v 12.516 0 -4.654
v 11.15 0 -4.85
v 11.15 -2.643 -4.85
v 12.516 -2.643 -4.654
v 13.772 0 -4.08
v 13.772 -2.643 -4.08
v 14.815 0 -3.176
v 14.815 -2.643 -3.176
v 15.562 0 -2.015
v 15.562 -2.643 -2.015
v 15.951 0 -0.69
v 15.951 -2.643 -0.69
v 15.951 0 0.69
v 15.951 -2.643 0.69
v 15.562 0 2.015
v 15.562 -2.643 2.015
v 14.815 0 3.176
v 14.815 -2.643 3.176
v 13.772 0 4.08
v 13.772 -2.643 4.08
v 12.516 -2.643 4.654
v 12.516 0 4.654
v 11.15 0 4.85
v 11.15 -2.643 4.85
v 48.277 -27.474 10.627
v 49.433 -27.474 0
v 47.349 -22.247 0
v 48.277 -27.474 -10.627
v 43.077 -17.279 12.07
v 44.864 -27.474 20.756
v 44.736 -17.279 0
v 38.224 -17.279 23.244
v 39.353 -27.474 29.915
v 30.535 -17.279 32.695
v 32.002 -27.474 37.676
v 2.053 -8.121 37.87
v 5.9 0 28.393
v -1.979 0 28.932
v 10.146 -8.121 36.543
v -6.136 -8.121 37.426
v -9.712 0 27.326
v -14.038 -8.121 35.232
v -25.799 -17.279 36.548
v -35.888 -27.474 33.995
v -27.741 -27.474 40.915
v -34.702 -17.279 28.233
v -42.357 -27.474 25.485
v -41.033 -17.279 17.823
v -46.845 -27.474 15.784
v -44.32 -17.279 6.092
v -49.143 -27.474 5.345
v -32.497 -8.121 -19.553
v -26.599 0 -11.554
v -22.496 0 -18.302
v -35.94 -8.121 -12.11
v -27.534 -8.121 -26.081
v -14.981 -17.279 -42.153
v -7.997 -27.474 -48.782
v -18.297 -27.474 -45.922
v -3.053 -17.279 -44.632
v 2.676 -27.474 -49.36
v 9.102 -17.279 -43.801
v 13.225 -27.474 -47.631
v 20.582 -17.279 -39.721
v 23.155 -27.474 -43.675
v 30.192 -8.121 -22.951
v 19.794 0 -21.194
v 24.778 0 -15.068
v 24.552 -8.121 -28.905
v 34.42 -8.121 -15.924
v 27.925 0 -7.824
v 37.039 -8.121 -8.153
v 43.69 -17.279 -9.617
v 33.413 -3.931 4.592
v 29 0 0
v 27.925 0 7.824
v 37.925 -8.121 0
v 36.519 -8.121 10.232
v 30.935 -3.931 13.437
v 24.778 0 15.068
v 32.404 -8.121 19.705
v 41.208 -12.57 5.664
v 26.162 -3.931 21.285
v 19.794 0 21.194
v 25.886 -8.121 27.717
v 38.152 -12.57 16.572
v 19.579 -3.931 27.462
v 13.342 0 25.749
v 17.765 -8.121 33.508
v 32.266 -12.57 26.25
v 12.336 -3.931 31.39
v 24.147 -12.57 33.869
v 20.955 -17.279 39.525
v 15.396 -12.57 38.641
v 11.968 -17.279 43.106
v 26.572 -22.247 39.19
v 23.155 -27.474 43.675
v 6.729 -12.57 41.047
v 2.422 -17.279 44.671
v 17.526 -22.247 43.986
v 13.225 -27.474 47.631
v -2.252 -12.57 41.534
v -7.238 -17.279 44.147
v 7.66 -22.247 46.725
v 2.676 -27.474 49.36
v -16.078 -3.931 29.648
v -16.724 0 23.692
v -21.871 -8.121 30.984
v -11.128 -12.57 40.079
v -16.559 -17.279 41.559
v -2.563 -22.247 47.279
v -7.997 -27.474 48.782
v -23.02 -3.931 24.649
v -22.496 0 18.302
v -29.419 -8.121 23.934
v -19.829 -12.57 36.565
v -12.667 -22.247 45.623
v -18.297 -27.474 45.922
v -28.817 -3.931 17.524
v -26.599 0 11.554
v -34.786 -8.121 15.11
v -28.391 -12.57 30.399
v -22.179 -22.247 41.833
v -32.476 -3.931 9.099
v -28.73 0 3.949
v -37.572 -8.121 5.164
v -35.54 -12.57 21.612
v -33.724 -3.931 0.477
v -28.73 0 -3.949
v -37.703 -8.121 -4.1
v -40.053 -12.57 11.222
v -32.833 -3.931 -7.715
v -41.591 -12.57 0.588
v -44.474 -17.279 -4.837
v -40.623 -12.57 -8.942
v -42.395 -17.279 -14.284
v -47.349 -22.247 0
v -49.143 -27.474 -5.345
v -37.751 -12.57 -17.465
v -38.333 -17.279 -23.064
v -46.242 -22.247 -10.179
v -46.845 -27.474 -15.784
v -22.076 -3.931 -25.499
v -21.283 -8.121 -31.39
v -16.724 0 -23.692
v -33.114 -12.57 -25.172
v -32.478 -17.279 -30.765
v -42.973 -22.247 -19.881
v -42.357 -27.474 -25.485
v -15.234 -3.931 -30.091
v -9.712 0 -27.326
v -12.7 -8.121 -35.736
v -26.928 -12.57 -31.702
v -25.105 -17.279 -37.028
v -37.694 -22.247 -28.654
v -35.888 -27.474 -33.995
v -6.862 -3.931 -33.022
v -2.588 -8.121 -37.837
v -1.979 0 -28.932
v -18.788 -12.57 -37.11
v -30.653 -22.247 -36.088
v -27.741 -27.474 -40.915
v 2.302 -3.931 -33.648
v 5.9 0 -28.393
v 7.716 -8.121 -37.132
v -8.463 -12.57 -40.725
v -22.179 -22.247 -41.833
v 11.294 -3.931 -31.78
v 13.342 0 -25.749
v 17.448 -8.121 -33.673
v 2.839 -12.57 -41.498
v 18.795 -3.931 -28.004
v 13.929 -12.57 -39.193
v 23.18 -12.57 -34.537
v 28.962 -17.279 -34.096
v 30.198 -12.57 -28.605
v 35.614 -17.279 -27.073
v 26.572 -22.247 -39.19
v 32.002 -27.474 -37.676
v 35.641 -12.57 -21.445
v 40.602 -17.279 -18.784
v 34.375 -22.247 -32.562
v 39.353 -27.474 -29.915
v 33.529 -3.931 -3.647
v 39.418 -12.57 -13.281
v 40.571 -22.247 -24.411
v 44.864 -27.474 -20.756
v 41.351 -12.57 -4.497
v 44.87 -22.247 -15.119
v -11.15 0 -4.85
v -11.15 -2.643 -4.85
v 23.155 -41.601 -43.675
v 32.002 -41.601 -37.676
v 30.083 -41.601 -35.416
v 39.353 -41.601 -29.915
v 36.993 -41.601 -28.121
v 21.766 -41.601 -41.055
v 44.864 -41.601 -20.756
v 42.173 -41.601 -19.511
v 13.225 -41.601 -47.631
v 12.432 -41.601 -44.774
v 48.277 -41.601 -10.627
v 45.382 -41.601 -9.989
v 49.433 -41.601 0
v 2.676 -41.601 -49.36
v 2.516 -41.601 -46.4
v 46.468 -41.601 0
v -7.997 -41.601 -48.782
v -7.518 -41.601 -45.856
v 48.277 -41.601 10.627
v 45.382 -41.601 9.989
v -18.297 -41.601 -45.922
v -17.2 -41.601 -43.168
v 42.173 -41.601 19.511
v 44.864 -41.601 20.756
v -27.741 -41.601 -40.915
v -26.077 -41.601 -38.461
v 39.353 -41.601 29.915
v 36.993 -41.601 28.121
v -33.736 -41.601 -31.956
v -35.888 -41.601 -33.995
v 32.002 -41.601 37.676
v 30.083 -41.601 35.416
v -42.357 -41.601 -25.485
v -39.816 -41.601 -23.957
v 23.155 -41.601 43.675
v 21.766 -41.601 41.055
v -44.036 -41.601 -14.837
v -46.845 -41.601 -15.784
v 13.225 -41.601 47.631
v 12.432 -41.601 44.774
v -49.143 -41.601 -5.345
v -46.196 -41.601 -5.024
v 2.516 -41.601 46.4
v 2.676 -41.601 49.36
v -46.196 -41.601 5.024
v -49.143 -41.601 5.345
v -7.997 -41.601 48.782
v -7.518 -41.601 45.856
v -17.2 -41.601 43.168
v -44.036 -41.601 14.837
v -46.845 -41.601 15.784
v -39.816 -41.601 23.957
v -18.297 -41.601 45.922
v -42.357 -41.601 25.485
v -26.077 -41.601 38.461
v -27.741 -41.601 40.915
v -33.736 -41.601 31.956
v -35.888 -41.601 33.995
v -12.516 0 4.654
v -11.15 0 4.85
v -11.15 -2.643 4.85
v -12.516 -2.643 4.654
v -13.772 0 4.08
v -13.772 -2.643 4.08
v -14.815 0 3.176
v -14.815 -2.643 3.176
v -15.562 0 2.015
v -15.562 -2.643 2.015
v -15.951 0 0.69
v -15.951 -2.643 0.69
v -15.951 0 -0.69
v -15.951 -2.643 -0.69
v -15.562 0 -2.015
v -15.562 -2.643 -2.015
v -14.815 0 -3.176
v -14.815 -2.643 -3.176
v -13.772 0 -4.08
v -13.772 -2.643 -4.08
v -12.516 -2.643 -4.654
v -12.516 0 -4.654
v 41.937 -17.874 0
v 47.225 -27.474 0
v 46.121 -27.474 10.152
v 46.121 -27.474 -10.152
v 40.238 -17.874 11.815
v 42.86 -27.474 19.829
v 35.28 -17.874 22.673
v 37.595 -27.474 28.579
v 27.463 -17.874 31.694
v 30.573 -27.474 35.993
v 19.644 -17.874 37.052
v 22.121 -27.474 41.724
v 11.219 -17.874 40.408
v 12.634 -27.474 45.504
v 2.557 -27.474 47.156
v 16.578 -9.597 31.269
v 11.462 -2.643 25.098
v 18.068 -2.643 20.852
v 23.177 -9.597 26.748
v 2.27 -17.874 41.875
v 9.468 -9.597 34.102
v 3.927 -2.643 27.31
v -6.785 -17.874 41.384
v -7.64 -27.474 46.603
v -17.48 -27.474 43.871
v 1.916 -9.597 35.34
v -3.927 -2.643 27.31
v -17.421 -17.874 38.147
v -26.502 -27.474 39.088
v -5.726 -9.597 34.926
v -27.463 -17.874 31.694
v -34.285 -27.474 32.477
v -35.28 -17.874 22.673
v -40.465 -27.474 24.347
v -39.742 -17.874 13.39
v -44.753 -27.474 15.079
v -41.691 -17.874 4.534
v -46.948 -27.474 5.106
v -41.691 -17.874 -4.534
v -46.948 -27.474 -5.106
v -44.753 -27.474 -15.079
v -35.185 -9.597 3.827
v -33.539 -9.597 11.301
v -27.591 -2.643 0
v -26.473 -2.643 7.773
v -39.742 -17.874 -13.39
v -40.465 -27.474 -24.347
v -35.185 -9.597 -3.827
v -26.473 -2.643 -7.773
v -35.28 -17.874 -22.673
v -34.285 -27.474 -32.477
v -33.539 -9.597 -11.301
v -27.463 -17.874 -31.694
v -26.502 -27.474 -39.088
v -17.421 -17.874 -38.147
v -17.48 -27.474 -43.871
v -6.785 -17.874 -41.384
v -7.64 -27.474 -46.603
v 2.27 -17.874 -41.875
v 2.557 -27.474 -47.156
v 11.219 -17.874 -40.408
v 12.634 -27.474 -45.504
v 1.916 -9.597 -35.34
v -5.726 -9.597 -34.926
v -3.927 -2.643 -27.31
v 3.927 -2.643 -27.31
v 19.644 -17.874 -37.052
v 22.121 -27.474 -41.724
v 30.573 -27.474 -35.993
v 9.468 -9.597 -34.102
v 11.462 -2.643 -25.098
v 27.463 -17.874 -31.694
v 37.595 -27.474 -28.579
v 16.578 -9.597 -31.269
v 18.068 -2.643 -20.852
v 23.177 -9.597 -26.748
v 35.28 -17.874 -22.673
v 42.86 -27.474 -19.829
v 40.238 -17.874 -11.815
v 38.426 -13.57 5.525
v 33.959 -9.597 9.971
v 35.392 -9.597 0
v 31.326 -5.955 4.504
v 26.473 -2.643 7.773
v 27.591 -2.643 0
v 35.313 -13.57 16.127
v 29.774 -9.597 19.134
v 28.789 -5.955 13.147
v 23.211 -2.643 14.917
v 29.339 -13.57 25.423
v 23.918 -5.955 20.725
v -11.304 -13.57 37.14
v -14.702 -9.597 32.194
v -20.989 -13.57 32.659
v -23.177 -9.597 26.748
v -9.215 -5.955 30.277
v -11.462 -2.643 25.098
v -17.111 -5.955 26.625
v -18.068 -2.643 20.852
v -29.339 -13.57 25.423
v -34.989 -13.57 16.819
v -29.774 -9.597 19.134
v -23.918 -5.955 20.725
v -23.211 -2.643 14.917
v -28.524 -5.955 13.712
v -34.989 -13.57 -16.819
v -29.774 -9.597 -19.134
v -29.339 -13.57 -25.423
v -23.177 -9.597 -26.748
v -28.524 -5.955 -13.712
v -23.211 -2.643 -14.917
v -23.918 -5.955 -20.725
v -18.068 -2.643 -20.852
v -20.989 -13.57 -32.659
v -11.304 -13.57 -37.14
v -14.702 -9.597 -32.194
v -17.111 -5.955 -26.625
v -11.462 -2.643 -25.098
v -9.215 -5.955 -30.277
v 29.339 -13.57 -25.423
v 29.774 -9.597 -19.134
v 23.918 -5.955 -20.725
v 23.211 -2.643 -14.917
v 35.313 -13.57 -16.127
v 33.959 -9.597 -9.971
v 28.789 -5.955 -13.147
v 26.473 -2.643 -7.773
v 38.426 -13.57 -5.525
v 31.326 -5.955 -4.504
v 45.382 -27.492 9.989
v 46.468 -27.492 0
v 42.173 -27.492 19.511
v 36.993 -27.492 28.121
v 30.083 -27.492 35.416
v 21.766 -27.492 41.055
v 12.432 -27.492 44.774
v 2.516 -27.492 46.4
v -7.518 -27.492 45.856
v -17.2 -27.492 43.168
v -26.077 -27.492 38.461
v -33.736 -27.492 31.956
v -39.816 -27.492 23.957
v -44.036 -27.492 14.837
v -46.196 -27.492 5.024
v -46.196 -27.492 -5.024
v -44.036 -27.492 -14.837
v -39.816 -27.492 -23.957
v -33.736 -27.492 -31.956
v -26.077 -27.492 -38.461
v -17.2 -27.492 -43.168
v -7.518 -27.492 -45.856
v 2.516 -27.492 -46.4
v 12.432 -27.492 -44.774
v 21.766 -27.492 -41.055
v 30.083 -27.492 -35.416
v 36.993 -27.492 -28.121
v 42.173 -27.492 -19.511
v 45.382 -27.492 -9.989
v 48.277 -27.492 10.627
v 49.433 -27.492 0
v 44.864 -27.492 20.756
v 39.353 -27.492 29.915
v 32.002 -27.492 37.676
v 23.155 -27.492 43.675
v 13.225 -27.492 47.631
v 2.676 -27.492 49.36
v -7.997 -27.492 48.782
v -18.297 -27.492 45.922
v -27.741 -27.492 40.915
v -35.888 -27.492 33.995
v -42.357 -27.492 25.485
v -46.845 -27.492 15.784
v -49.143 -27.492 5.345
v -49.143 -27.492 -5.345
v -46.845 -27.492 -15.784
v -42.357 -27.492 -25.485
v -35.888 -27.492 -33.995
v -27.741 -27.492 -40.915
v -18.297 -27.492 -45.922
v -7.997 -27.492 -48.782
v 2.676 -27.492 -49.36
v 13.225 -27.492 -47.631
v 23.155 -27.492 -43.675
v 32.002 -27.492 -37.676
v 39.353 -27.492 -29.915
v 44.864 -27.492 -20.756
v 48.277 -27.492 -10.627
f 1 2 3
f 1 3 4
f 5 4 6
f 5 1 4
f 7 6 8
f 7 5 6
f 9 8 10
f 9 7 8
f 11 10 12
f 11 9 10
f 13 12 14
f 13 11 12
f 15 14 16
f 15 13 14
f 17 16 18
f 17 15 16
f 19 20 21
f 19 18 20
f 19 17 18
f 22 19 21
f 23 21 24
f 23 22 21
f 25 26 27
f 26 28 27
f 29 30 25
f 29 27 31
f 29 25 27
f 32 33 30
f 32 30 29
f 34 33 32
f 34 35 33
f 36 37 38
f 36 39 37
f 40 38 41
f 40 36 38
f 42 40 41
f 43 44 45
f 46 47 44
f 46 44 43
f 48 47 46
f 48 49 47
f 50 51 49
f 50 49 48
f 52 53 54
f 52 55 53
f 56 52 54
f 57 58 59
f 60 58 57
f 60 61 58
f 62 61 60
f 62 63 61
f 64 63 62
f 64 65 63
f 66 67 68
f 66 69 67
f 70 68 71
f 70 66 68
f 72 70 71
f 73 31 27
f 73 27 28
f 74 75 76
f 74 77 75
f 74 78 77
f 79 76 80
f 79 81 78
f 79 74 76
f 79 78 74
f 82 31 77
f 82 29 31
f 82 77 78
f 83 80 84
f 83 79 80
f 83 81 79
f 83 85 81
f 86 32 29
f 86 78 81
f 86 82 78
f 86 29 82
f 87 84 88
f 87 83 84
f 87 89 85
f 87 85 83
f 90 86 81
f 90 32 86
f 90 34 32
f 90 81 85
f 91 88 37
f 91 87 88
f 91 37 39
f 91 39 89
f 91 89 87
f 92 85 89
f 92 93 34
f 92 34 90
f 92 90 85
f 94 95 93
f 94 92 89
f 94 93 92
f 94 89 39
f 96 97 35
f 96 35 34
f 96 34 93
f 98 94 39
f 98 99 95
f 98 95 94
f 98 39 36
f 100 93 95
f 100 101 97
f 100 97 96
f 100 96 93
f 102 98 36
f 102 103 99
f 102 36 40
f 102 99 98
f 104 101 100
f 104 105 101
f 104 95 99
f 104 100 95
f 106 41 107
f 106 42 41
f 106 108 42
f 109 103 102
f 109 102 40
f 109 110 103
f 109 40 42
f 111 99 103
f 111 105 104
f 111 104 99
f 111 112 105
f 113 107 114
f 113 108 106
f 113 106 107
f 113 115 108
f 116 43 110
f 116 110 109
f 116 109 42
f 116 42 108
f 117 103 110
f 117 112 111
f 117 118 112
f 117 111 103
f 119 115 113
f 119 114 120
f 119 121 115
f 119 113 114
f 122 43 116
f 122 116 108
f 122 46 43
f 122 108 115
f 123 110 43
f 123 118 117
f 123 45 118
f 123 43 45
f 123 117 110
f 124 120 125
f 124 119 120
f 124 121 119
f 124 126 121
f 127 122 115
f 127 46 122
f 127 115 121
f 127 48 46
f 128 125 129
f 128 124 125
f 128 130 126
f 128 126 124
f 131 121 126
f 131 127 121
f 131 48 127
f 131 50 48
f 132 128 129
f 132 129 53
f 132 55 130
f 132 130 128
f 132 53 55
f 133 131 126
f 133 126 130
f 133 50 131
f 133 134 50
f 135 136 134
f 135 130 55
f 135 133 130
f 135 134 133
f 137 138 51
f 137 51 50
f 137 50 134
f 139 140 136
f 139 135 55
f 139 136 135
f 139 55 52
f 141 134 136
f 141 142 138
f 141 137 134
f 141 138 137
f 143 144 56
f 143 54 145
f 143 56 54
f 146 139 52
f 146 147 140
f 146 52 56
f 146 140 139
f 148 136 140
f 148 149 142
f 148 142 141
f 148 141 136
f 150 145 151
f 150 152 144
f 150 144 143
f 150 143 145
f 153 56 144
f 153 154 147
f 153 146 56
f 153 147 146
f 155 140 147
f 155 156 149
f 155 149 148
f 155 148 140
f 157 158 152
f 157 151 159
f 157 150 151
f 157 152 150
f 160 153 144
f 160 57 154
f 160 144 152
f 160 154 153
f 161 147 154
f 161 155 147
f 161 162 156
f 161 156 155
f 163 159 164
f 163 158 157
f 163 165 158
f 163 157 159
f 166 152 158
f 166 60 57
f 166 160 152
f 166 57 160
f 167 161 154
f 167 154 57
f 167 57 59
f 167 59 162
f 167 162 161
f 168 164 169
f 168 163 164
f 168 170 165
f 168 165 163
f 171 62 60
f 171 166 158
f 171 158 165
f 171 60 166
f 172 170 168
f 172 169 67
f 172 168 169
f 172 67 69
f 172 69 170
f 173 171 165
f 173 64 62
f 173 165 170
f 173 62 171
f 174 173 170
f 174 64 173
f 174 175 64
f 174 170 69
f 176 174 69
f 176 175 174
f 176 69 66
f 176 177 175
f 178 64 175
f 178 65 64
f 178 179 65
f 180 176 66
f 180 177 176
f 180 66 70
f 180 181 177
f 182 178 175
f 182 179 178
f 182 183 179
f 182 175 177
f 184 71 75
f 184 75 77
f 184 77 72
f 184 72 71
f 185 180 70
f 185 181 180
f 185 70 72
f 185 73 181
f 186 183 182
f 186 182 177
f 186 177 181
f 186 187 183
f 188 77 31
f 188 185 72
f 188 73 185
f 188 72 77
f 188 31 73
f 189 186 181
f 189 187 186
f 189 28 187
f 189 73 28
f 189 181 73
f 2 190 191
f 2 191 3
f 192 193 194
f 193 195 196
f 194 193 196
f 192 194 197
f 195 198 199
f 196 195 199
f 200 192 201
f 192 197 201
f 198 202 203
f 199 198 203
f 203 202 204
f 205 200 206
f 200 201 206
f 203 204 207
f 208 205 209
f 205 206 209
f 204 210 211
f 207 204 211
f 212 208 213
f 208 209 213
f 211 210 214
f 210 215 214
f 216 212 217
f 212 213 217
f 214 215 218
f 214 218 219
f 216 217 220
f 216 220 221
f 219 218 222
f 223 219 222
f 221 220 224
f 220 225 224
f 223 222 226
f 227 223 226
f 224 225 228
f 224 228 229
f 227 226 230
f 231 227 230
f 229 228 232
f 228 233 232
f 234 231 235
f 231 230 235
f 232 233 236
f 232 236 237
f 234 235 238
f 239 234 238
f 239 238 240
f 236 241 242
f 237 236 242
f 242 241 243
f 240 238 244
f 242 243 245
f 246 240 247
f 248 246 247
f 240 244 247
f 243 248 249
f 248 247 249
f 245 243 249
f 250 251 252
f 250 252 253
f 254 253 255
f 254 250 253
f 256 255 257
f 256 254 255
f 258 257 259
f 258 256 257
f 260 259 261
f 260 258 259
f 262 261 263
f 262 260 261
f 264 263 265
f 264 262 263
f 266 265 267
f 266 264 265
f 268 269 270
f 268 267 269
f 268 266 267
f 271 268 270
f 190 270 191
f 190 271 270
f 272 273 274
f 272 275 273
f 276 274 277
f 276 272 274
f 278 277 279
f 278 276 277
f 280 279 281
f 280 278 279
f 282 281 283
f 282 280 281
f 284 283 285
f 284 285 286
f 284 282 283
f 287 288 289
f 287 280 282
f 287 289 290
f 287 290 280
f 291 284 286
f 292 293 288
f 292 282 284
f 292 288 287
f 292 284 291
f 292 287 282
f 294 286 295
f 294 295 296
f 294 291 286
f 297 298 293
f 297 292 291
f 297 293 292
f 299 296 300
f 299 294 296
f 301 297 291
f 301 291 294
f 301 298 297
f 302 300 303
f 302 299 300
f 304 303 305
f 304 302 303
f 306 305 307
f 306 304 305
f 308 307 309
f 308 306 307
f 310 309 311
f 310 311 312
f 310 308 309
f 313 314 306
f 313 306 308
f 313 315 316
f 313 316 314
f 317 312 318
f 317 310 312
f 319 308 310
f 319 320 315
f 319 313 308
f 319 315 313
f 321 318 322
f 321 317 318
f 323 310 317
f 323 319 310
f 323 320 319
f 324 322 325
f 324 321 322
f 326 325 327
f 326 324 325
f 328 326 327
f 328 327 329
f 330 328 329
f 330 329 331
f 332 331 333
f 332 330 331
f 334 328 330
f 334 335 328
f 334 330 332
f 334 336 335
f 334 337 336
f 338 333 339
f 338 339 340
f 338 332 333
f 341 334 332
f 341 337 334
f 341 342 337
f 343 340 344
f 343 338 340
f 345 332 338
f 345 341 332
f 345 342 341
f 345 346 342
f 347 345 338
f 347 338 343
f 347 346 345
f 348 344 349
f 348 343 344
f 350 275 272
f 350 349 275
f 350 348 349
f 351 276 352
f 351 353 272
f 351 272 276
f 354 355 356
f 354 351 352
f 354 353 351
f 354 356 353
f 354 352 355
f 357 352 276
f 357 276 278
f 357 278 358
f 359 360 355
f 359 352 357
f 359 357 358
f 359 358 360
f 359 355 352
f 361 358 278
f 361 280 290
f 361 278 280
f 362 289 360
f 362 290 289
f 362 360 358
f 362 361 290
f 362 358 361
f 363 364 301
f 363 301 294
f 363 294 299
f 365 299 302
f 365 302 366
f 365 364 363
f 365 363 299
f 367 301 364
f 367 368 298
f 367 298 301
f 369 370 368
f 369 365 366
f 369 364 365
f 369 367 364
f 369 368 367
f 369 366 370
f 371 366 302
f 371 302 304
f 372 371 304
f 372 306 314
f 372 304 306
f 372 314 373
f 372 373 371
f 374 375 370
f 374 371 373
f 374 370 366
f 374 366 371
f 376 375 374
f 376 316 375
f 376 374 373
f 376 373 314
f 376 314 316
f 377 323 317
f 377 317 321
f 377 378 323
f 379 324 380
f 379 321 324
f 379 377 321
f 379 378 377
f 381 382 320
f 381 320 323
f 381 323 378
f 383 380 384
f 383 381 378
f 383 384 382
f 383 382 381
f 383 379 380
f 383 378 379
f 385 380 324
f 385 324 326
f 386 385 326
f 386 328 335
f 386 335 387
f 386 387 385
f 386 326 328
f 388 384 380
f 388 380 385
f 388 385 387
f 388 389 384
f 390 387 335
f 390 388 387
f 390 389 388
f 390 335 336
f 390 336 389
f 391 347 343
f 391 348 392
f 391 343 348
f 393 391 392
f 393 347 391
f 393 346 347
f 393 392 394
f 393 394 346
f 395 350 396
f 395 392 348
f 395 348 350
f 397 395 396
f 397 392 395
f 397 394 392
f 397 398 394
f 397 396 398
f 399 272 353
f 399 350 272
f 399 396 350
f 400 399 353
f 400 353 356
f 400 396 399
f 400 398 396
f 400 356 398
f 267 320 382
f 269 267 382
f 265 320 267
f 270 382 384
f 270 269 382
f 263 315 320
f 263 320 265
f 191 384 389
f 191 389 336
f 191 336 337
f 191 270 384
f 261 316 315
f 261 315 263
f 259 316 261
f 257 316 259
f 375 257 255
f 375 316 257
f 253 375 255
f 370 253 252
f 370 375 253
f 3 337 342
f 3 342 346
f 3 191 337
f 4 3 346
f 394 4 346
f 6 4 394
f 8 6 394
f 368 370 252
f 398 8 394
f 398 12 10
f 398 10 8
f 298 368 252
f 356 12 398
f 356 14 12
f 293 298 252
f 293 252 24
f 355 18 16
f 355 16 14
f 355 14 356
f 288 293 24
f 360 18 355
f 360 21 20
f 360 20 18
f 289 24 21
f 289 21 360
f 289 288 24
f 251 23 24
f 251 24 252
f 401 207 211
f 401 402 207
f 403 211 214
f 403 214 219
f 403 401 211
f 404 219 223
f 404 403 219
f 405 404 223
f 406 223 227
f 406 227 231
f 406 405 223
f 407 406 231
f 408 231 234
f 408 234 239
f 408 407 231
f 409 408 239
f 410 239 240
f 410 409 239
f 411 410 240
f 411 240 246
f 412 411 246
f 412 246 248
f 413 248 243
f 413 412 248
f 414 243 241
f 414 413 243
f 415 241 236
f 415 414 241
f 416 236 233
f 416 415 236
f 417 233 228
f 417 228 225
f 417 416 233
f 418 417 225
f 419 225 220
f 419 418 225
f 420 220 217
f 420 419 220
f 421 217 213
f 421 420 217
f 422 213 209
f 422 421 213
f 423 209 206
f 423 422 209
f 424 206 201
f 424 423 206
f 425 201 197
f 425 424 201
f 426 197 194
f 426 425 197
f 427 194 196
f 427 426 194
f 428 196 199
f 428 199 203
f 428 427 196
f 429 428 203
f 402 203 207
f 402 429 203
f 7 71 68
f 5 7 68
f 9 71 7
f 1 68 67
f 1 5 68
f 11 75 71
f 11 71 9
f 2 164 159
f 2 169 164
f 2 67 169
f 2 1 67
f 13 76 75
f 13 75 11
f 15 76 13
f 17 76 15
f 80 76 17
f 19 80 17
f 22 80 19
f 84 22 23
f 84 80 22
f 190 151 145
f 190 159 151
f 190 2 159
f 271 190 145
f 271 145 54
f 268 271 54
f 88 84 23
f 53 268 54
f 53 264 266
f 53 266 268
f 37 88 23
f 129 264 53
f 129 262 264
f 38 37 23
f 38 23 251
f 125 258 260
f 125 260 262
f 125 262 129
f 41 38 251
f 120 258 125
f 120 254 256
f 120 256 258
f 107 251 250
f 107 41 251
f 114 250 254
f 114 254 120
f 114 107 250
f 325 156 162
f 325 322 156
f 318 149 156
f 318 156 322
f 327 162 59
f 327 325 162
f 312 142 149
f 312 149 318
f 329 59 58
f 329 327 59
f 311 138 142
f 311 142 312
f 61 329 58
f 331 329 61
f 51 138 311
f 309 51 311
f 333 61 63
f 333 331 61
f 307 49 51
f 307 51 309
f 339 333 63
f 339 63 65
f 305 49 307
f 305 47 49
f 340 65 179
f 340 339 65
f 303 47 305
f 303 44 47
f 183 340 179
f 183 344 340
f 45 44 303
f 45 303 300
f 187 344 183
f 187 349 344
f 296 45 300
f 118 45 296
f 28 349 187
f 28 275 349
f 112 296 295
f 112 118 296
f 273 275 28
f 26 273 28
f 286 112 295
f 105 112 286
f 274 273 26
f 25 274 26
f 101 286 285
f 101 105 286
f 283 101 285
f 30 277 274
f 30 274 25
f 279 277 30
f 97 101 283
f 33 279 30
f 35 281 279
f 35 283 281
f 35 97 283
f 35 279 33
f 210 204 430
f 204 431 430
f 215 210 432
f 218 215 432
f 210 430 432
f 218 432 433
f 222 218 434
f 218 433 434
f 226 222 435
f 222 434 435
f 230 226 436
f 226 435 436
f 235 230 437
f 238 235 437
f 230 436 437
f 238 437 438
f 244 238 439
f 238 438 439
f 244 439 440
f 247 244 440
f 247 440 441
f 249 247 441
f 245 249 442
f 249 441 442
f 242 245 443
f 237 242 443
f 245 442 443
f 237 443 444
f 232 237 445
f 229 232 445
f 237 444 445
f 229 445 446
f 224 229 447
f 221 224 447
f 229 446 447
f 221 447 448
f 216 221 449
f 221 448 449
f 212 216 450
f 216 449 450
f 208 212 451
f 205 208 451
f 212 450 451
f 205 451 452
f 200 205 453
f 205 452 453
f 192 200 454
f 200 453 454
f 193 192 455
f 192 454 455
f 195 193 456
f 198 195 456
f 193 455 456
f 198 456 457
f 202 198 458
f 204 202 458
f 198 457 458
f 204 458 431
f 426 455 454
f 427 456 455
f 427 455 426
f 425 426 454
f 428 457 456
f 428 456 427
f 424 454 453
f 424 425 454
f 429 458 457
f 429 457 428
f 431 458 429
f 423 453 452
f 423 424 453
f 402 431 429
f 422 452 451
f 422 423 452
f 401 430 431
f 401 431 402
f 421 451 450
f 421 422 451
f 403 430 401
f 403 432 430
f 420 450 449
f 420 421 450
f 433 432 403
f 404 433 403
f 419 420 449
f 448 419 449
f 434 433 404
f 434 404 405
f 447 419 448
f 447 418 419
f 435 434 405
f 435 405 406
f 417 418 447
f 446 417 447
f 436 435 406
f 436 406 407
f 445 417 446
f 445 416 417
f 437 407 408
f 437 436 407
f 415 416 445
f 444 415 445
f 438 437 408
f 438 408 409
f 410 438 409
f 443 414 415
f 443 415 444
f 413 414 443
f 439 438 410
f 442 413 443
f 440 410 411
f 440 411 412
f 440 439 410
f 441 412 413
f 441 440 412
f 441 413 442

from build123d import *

# Parameters (mm, degrees)
SKETCH3_W          = 2.964832231
SKETCH3_H          = 14.108919269
CUT_EXTRUDE3_DEPTH = 10


with BuildPart() as part:
    # Sketch2 → Revolve1 (revolve)
    with BuildSketch(Plane.XY):
        with BuildLine():
            Line((0, 0), (29, 0))
            add(Edge.make_bspline(
                [(29, 0), (43.973856775, -11.403607847), (49.432853271, -27.473975523)],
                knots=[0, 0, 0, 0.848255364, 0.848255364, 0.848255364], degree=2))
            Line((49.432853271, -27.473975523), (47.224927371, -27.473975523))
            add(Edge.make_bspline(
                [(47.224927371, -27.473975523), (40.235215176, -12.081344627), (27.590919343, -2.643455387)],
                knots=[0, 0, 0, 0.915287791, 0.915287791, 0.915287791], degree=2))
            Line((27.590919343, -2.643455387), (0, -2.643455387))
            Line((0, -2.643455387), (0, 0))
        make_face()
    revolve(axis=Axis((0, 39.692648139, 0), (0, -1, 0)))

    # Sketch6 → Cut-Extrude3 (cut)
    with BuildSketch(Plane(origin=(0, 0, 0), x_dir=(1, 0, 0), z_dir=(0, 1, 0))):
        with BuildLine():
            Line((-11.15, 4.85), (11.15, 4.85))
            ThreePointArc((11.15, 4.85), (16, 0), (11.15, -4.85))
            Line((11.15, -4.85), (-11.15, -4.85))
            ThreePointArc((-11.15, -4.85), (-16, 0), (-11.15, 4.85))
        make_face()
    extrude(amount=-CUT_EXTRUDE3_DEPTH, mode=Mode.SUBTRACT)


with BuildPart() as body_2:
    # Sketch3 → Revolve2 (revolve)
    with BuildSketch(Plane.XY):
        with Locations((47.950437156, -34.546192387)):
            Rectangle(SKETCH3_W, SKETCH3_H)
    revolve(axis=Axis((0, 0, 0), (0, -1, 0)))


solid = Compound([part.part, body_2.part])
